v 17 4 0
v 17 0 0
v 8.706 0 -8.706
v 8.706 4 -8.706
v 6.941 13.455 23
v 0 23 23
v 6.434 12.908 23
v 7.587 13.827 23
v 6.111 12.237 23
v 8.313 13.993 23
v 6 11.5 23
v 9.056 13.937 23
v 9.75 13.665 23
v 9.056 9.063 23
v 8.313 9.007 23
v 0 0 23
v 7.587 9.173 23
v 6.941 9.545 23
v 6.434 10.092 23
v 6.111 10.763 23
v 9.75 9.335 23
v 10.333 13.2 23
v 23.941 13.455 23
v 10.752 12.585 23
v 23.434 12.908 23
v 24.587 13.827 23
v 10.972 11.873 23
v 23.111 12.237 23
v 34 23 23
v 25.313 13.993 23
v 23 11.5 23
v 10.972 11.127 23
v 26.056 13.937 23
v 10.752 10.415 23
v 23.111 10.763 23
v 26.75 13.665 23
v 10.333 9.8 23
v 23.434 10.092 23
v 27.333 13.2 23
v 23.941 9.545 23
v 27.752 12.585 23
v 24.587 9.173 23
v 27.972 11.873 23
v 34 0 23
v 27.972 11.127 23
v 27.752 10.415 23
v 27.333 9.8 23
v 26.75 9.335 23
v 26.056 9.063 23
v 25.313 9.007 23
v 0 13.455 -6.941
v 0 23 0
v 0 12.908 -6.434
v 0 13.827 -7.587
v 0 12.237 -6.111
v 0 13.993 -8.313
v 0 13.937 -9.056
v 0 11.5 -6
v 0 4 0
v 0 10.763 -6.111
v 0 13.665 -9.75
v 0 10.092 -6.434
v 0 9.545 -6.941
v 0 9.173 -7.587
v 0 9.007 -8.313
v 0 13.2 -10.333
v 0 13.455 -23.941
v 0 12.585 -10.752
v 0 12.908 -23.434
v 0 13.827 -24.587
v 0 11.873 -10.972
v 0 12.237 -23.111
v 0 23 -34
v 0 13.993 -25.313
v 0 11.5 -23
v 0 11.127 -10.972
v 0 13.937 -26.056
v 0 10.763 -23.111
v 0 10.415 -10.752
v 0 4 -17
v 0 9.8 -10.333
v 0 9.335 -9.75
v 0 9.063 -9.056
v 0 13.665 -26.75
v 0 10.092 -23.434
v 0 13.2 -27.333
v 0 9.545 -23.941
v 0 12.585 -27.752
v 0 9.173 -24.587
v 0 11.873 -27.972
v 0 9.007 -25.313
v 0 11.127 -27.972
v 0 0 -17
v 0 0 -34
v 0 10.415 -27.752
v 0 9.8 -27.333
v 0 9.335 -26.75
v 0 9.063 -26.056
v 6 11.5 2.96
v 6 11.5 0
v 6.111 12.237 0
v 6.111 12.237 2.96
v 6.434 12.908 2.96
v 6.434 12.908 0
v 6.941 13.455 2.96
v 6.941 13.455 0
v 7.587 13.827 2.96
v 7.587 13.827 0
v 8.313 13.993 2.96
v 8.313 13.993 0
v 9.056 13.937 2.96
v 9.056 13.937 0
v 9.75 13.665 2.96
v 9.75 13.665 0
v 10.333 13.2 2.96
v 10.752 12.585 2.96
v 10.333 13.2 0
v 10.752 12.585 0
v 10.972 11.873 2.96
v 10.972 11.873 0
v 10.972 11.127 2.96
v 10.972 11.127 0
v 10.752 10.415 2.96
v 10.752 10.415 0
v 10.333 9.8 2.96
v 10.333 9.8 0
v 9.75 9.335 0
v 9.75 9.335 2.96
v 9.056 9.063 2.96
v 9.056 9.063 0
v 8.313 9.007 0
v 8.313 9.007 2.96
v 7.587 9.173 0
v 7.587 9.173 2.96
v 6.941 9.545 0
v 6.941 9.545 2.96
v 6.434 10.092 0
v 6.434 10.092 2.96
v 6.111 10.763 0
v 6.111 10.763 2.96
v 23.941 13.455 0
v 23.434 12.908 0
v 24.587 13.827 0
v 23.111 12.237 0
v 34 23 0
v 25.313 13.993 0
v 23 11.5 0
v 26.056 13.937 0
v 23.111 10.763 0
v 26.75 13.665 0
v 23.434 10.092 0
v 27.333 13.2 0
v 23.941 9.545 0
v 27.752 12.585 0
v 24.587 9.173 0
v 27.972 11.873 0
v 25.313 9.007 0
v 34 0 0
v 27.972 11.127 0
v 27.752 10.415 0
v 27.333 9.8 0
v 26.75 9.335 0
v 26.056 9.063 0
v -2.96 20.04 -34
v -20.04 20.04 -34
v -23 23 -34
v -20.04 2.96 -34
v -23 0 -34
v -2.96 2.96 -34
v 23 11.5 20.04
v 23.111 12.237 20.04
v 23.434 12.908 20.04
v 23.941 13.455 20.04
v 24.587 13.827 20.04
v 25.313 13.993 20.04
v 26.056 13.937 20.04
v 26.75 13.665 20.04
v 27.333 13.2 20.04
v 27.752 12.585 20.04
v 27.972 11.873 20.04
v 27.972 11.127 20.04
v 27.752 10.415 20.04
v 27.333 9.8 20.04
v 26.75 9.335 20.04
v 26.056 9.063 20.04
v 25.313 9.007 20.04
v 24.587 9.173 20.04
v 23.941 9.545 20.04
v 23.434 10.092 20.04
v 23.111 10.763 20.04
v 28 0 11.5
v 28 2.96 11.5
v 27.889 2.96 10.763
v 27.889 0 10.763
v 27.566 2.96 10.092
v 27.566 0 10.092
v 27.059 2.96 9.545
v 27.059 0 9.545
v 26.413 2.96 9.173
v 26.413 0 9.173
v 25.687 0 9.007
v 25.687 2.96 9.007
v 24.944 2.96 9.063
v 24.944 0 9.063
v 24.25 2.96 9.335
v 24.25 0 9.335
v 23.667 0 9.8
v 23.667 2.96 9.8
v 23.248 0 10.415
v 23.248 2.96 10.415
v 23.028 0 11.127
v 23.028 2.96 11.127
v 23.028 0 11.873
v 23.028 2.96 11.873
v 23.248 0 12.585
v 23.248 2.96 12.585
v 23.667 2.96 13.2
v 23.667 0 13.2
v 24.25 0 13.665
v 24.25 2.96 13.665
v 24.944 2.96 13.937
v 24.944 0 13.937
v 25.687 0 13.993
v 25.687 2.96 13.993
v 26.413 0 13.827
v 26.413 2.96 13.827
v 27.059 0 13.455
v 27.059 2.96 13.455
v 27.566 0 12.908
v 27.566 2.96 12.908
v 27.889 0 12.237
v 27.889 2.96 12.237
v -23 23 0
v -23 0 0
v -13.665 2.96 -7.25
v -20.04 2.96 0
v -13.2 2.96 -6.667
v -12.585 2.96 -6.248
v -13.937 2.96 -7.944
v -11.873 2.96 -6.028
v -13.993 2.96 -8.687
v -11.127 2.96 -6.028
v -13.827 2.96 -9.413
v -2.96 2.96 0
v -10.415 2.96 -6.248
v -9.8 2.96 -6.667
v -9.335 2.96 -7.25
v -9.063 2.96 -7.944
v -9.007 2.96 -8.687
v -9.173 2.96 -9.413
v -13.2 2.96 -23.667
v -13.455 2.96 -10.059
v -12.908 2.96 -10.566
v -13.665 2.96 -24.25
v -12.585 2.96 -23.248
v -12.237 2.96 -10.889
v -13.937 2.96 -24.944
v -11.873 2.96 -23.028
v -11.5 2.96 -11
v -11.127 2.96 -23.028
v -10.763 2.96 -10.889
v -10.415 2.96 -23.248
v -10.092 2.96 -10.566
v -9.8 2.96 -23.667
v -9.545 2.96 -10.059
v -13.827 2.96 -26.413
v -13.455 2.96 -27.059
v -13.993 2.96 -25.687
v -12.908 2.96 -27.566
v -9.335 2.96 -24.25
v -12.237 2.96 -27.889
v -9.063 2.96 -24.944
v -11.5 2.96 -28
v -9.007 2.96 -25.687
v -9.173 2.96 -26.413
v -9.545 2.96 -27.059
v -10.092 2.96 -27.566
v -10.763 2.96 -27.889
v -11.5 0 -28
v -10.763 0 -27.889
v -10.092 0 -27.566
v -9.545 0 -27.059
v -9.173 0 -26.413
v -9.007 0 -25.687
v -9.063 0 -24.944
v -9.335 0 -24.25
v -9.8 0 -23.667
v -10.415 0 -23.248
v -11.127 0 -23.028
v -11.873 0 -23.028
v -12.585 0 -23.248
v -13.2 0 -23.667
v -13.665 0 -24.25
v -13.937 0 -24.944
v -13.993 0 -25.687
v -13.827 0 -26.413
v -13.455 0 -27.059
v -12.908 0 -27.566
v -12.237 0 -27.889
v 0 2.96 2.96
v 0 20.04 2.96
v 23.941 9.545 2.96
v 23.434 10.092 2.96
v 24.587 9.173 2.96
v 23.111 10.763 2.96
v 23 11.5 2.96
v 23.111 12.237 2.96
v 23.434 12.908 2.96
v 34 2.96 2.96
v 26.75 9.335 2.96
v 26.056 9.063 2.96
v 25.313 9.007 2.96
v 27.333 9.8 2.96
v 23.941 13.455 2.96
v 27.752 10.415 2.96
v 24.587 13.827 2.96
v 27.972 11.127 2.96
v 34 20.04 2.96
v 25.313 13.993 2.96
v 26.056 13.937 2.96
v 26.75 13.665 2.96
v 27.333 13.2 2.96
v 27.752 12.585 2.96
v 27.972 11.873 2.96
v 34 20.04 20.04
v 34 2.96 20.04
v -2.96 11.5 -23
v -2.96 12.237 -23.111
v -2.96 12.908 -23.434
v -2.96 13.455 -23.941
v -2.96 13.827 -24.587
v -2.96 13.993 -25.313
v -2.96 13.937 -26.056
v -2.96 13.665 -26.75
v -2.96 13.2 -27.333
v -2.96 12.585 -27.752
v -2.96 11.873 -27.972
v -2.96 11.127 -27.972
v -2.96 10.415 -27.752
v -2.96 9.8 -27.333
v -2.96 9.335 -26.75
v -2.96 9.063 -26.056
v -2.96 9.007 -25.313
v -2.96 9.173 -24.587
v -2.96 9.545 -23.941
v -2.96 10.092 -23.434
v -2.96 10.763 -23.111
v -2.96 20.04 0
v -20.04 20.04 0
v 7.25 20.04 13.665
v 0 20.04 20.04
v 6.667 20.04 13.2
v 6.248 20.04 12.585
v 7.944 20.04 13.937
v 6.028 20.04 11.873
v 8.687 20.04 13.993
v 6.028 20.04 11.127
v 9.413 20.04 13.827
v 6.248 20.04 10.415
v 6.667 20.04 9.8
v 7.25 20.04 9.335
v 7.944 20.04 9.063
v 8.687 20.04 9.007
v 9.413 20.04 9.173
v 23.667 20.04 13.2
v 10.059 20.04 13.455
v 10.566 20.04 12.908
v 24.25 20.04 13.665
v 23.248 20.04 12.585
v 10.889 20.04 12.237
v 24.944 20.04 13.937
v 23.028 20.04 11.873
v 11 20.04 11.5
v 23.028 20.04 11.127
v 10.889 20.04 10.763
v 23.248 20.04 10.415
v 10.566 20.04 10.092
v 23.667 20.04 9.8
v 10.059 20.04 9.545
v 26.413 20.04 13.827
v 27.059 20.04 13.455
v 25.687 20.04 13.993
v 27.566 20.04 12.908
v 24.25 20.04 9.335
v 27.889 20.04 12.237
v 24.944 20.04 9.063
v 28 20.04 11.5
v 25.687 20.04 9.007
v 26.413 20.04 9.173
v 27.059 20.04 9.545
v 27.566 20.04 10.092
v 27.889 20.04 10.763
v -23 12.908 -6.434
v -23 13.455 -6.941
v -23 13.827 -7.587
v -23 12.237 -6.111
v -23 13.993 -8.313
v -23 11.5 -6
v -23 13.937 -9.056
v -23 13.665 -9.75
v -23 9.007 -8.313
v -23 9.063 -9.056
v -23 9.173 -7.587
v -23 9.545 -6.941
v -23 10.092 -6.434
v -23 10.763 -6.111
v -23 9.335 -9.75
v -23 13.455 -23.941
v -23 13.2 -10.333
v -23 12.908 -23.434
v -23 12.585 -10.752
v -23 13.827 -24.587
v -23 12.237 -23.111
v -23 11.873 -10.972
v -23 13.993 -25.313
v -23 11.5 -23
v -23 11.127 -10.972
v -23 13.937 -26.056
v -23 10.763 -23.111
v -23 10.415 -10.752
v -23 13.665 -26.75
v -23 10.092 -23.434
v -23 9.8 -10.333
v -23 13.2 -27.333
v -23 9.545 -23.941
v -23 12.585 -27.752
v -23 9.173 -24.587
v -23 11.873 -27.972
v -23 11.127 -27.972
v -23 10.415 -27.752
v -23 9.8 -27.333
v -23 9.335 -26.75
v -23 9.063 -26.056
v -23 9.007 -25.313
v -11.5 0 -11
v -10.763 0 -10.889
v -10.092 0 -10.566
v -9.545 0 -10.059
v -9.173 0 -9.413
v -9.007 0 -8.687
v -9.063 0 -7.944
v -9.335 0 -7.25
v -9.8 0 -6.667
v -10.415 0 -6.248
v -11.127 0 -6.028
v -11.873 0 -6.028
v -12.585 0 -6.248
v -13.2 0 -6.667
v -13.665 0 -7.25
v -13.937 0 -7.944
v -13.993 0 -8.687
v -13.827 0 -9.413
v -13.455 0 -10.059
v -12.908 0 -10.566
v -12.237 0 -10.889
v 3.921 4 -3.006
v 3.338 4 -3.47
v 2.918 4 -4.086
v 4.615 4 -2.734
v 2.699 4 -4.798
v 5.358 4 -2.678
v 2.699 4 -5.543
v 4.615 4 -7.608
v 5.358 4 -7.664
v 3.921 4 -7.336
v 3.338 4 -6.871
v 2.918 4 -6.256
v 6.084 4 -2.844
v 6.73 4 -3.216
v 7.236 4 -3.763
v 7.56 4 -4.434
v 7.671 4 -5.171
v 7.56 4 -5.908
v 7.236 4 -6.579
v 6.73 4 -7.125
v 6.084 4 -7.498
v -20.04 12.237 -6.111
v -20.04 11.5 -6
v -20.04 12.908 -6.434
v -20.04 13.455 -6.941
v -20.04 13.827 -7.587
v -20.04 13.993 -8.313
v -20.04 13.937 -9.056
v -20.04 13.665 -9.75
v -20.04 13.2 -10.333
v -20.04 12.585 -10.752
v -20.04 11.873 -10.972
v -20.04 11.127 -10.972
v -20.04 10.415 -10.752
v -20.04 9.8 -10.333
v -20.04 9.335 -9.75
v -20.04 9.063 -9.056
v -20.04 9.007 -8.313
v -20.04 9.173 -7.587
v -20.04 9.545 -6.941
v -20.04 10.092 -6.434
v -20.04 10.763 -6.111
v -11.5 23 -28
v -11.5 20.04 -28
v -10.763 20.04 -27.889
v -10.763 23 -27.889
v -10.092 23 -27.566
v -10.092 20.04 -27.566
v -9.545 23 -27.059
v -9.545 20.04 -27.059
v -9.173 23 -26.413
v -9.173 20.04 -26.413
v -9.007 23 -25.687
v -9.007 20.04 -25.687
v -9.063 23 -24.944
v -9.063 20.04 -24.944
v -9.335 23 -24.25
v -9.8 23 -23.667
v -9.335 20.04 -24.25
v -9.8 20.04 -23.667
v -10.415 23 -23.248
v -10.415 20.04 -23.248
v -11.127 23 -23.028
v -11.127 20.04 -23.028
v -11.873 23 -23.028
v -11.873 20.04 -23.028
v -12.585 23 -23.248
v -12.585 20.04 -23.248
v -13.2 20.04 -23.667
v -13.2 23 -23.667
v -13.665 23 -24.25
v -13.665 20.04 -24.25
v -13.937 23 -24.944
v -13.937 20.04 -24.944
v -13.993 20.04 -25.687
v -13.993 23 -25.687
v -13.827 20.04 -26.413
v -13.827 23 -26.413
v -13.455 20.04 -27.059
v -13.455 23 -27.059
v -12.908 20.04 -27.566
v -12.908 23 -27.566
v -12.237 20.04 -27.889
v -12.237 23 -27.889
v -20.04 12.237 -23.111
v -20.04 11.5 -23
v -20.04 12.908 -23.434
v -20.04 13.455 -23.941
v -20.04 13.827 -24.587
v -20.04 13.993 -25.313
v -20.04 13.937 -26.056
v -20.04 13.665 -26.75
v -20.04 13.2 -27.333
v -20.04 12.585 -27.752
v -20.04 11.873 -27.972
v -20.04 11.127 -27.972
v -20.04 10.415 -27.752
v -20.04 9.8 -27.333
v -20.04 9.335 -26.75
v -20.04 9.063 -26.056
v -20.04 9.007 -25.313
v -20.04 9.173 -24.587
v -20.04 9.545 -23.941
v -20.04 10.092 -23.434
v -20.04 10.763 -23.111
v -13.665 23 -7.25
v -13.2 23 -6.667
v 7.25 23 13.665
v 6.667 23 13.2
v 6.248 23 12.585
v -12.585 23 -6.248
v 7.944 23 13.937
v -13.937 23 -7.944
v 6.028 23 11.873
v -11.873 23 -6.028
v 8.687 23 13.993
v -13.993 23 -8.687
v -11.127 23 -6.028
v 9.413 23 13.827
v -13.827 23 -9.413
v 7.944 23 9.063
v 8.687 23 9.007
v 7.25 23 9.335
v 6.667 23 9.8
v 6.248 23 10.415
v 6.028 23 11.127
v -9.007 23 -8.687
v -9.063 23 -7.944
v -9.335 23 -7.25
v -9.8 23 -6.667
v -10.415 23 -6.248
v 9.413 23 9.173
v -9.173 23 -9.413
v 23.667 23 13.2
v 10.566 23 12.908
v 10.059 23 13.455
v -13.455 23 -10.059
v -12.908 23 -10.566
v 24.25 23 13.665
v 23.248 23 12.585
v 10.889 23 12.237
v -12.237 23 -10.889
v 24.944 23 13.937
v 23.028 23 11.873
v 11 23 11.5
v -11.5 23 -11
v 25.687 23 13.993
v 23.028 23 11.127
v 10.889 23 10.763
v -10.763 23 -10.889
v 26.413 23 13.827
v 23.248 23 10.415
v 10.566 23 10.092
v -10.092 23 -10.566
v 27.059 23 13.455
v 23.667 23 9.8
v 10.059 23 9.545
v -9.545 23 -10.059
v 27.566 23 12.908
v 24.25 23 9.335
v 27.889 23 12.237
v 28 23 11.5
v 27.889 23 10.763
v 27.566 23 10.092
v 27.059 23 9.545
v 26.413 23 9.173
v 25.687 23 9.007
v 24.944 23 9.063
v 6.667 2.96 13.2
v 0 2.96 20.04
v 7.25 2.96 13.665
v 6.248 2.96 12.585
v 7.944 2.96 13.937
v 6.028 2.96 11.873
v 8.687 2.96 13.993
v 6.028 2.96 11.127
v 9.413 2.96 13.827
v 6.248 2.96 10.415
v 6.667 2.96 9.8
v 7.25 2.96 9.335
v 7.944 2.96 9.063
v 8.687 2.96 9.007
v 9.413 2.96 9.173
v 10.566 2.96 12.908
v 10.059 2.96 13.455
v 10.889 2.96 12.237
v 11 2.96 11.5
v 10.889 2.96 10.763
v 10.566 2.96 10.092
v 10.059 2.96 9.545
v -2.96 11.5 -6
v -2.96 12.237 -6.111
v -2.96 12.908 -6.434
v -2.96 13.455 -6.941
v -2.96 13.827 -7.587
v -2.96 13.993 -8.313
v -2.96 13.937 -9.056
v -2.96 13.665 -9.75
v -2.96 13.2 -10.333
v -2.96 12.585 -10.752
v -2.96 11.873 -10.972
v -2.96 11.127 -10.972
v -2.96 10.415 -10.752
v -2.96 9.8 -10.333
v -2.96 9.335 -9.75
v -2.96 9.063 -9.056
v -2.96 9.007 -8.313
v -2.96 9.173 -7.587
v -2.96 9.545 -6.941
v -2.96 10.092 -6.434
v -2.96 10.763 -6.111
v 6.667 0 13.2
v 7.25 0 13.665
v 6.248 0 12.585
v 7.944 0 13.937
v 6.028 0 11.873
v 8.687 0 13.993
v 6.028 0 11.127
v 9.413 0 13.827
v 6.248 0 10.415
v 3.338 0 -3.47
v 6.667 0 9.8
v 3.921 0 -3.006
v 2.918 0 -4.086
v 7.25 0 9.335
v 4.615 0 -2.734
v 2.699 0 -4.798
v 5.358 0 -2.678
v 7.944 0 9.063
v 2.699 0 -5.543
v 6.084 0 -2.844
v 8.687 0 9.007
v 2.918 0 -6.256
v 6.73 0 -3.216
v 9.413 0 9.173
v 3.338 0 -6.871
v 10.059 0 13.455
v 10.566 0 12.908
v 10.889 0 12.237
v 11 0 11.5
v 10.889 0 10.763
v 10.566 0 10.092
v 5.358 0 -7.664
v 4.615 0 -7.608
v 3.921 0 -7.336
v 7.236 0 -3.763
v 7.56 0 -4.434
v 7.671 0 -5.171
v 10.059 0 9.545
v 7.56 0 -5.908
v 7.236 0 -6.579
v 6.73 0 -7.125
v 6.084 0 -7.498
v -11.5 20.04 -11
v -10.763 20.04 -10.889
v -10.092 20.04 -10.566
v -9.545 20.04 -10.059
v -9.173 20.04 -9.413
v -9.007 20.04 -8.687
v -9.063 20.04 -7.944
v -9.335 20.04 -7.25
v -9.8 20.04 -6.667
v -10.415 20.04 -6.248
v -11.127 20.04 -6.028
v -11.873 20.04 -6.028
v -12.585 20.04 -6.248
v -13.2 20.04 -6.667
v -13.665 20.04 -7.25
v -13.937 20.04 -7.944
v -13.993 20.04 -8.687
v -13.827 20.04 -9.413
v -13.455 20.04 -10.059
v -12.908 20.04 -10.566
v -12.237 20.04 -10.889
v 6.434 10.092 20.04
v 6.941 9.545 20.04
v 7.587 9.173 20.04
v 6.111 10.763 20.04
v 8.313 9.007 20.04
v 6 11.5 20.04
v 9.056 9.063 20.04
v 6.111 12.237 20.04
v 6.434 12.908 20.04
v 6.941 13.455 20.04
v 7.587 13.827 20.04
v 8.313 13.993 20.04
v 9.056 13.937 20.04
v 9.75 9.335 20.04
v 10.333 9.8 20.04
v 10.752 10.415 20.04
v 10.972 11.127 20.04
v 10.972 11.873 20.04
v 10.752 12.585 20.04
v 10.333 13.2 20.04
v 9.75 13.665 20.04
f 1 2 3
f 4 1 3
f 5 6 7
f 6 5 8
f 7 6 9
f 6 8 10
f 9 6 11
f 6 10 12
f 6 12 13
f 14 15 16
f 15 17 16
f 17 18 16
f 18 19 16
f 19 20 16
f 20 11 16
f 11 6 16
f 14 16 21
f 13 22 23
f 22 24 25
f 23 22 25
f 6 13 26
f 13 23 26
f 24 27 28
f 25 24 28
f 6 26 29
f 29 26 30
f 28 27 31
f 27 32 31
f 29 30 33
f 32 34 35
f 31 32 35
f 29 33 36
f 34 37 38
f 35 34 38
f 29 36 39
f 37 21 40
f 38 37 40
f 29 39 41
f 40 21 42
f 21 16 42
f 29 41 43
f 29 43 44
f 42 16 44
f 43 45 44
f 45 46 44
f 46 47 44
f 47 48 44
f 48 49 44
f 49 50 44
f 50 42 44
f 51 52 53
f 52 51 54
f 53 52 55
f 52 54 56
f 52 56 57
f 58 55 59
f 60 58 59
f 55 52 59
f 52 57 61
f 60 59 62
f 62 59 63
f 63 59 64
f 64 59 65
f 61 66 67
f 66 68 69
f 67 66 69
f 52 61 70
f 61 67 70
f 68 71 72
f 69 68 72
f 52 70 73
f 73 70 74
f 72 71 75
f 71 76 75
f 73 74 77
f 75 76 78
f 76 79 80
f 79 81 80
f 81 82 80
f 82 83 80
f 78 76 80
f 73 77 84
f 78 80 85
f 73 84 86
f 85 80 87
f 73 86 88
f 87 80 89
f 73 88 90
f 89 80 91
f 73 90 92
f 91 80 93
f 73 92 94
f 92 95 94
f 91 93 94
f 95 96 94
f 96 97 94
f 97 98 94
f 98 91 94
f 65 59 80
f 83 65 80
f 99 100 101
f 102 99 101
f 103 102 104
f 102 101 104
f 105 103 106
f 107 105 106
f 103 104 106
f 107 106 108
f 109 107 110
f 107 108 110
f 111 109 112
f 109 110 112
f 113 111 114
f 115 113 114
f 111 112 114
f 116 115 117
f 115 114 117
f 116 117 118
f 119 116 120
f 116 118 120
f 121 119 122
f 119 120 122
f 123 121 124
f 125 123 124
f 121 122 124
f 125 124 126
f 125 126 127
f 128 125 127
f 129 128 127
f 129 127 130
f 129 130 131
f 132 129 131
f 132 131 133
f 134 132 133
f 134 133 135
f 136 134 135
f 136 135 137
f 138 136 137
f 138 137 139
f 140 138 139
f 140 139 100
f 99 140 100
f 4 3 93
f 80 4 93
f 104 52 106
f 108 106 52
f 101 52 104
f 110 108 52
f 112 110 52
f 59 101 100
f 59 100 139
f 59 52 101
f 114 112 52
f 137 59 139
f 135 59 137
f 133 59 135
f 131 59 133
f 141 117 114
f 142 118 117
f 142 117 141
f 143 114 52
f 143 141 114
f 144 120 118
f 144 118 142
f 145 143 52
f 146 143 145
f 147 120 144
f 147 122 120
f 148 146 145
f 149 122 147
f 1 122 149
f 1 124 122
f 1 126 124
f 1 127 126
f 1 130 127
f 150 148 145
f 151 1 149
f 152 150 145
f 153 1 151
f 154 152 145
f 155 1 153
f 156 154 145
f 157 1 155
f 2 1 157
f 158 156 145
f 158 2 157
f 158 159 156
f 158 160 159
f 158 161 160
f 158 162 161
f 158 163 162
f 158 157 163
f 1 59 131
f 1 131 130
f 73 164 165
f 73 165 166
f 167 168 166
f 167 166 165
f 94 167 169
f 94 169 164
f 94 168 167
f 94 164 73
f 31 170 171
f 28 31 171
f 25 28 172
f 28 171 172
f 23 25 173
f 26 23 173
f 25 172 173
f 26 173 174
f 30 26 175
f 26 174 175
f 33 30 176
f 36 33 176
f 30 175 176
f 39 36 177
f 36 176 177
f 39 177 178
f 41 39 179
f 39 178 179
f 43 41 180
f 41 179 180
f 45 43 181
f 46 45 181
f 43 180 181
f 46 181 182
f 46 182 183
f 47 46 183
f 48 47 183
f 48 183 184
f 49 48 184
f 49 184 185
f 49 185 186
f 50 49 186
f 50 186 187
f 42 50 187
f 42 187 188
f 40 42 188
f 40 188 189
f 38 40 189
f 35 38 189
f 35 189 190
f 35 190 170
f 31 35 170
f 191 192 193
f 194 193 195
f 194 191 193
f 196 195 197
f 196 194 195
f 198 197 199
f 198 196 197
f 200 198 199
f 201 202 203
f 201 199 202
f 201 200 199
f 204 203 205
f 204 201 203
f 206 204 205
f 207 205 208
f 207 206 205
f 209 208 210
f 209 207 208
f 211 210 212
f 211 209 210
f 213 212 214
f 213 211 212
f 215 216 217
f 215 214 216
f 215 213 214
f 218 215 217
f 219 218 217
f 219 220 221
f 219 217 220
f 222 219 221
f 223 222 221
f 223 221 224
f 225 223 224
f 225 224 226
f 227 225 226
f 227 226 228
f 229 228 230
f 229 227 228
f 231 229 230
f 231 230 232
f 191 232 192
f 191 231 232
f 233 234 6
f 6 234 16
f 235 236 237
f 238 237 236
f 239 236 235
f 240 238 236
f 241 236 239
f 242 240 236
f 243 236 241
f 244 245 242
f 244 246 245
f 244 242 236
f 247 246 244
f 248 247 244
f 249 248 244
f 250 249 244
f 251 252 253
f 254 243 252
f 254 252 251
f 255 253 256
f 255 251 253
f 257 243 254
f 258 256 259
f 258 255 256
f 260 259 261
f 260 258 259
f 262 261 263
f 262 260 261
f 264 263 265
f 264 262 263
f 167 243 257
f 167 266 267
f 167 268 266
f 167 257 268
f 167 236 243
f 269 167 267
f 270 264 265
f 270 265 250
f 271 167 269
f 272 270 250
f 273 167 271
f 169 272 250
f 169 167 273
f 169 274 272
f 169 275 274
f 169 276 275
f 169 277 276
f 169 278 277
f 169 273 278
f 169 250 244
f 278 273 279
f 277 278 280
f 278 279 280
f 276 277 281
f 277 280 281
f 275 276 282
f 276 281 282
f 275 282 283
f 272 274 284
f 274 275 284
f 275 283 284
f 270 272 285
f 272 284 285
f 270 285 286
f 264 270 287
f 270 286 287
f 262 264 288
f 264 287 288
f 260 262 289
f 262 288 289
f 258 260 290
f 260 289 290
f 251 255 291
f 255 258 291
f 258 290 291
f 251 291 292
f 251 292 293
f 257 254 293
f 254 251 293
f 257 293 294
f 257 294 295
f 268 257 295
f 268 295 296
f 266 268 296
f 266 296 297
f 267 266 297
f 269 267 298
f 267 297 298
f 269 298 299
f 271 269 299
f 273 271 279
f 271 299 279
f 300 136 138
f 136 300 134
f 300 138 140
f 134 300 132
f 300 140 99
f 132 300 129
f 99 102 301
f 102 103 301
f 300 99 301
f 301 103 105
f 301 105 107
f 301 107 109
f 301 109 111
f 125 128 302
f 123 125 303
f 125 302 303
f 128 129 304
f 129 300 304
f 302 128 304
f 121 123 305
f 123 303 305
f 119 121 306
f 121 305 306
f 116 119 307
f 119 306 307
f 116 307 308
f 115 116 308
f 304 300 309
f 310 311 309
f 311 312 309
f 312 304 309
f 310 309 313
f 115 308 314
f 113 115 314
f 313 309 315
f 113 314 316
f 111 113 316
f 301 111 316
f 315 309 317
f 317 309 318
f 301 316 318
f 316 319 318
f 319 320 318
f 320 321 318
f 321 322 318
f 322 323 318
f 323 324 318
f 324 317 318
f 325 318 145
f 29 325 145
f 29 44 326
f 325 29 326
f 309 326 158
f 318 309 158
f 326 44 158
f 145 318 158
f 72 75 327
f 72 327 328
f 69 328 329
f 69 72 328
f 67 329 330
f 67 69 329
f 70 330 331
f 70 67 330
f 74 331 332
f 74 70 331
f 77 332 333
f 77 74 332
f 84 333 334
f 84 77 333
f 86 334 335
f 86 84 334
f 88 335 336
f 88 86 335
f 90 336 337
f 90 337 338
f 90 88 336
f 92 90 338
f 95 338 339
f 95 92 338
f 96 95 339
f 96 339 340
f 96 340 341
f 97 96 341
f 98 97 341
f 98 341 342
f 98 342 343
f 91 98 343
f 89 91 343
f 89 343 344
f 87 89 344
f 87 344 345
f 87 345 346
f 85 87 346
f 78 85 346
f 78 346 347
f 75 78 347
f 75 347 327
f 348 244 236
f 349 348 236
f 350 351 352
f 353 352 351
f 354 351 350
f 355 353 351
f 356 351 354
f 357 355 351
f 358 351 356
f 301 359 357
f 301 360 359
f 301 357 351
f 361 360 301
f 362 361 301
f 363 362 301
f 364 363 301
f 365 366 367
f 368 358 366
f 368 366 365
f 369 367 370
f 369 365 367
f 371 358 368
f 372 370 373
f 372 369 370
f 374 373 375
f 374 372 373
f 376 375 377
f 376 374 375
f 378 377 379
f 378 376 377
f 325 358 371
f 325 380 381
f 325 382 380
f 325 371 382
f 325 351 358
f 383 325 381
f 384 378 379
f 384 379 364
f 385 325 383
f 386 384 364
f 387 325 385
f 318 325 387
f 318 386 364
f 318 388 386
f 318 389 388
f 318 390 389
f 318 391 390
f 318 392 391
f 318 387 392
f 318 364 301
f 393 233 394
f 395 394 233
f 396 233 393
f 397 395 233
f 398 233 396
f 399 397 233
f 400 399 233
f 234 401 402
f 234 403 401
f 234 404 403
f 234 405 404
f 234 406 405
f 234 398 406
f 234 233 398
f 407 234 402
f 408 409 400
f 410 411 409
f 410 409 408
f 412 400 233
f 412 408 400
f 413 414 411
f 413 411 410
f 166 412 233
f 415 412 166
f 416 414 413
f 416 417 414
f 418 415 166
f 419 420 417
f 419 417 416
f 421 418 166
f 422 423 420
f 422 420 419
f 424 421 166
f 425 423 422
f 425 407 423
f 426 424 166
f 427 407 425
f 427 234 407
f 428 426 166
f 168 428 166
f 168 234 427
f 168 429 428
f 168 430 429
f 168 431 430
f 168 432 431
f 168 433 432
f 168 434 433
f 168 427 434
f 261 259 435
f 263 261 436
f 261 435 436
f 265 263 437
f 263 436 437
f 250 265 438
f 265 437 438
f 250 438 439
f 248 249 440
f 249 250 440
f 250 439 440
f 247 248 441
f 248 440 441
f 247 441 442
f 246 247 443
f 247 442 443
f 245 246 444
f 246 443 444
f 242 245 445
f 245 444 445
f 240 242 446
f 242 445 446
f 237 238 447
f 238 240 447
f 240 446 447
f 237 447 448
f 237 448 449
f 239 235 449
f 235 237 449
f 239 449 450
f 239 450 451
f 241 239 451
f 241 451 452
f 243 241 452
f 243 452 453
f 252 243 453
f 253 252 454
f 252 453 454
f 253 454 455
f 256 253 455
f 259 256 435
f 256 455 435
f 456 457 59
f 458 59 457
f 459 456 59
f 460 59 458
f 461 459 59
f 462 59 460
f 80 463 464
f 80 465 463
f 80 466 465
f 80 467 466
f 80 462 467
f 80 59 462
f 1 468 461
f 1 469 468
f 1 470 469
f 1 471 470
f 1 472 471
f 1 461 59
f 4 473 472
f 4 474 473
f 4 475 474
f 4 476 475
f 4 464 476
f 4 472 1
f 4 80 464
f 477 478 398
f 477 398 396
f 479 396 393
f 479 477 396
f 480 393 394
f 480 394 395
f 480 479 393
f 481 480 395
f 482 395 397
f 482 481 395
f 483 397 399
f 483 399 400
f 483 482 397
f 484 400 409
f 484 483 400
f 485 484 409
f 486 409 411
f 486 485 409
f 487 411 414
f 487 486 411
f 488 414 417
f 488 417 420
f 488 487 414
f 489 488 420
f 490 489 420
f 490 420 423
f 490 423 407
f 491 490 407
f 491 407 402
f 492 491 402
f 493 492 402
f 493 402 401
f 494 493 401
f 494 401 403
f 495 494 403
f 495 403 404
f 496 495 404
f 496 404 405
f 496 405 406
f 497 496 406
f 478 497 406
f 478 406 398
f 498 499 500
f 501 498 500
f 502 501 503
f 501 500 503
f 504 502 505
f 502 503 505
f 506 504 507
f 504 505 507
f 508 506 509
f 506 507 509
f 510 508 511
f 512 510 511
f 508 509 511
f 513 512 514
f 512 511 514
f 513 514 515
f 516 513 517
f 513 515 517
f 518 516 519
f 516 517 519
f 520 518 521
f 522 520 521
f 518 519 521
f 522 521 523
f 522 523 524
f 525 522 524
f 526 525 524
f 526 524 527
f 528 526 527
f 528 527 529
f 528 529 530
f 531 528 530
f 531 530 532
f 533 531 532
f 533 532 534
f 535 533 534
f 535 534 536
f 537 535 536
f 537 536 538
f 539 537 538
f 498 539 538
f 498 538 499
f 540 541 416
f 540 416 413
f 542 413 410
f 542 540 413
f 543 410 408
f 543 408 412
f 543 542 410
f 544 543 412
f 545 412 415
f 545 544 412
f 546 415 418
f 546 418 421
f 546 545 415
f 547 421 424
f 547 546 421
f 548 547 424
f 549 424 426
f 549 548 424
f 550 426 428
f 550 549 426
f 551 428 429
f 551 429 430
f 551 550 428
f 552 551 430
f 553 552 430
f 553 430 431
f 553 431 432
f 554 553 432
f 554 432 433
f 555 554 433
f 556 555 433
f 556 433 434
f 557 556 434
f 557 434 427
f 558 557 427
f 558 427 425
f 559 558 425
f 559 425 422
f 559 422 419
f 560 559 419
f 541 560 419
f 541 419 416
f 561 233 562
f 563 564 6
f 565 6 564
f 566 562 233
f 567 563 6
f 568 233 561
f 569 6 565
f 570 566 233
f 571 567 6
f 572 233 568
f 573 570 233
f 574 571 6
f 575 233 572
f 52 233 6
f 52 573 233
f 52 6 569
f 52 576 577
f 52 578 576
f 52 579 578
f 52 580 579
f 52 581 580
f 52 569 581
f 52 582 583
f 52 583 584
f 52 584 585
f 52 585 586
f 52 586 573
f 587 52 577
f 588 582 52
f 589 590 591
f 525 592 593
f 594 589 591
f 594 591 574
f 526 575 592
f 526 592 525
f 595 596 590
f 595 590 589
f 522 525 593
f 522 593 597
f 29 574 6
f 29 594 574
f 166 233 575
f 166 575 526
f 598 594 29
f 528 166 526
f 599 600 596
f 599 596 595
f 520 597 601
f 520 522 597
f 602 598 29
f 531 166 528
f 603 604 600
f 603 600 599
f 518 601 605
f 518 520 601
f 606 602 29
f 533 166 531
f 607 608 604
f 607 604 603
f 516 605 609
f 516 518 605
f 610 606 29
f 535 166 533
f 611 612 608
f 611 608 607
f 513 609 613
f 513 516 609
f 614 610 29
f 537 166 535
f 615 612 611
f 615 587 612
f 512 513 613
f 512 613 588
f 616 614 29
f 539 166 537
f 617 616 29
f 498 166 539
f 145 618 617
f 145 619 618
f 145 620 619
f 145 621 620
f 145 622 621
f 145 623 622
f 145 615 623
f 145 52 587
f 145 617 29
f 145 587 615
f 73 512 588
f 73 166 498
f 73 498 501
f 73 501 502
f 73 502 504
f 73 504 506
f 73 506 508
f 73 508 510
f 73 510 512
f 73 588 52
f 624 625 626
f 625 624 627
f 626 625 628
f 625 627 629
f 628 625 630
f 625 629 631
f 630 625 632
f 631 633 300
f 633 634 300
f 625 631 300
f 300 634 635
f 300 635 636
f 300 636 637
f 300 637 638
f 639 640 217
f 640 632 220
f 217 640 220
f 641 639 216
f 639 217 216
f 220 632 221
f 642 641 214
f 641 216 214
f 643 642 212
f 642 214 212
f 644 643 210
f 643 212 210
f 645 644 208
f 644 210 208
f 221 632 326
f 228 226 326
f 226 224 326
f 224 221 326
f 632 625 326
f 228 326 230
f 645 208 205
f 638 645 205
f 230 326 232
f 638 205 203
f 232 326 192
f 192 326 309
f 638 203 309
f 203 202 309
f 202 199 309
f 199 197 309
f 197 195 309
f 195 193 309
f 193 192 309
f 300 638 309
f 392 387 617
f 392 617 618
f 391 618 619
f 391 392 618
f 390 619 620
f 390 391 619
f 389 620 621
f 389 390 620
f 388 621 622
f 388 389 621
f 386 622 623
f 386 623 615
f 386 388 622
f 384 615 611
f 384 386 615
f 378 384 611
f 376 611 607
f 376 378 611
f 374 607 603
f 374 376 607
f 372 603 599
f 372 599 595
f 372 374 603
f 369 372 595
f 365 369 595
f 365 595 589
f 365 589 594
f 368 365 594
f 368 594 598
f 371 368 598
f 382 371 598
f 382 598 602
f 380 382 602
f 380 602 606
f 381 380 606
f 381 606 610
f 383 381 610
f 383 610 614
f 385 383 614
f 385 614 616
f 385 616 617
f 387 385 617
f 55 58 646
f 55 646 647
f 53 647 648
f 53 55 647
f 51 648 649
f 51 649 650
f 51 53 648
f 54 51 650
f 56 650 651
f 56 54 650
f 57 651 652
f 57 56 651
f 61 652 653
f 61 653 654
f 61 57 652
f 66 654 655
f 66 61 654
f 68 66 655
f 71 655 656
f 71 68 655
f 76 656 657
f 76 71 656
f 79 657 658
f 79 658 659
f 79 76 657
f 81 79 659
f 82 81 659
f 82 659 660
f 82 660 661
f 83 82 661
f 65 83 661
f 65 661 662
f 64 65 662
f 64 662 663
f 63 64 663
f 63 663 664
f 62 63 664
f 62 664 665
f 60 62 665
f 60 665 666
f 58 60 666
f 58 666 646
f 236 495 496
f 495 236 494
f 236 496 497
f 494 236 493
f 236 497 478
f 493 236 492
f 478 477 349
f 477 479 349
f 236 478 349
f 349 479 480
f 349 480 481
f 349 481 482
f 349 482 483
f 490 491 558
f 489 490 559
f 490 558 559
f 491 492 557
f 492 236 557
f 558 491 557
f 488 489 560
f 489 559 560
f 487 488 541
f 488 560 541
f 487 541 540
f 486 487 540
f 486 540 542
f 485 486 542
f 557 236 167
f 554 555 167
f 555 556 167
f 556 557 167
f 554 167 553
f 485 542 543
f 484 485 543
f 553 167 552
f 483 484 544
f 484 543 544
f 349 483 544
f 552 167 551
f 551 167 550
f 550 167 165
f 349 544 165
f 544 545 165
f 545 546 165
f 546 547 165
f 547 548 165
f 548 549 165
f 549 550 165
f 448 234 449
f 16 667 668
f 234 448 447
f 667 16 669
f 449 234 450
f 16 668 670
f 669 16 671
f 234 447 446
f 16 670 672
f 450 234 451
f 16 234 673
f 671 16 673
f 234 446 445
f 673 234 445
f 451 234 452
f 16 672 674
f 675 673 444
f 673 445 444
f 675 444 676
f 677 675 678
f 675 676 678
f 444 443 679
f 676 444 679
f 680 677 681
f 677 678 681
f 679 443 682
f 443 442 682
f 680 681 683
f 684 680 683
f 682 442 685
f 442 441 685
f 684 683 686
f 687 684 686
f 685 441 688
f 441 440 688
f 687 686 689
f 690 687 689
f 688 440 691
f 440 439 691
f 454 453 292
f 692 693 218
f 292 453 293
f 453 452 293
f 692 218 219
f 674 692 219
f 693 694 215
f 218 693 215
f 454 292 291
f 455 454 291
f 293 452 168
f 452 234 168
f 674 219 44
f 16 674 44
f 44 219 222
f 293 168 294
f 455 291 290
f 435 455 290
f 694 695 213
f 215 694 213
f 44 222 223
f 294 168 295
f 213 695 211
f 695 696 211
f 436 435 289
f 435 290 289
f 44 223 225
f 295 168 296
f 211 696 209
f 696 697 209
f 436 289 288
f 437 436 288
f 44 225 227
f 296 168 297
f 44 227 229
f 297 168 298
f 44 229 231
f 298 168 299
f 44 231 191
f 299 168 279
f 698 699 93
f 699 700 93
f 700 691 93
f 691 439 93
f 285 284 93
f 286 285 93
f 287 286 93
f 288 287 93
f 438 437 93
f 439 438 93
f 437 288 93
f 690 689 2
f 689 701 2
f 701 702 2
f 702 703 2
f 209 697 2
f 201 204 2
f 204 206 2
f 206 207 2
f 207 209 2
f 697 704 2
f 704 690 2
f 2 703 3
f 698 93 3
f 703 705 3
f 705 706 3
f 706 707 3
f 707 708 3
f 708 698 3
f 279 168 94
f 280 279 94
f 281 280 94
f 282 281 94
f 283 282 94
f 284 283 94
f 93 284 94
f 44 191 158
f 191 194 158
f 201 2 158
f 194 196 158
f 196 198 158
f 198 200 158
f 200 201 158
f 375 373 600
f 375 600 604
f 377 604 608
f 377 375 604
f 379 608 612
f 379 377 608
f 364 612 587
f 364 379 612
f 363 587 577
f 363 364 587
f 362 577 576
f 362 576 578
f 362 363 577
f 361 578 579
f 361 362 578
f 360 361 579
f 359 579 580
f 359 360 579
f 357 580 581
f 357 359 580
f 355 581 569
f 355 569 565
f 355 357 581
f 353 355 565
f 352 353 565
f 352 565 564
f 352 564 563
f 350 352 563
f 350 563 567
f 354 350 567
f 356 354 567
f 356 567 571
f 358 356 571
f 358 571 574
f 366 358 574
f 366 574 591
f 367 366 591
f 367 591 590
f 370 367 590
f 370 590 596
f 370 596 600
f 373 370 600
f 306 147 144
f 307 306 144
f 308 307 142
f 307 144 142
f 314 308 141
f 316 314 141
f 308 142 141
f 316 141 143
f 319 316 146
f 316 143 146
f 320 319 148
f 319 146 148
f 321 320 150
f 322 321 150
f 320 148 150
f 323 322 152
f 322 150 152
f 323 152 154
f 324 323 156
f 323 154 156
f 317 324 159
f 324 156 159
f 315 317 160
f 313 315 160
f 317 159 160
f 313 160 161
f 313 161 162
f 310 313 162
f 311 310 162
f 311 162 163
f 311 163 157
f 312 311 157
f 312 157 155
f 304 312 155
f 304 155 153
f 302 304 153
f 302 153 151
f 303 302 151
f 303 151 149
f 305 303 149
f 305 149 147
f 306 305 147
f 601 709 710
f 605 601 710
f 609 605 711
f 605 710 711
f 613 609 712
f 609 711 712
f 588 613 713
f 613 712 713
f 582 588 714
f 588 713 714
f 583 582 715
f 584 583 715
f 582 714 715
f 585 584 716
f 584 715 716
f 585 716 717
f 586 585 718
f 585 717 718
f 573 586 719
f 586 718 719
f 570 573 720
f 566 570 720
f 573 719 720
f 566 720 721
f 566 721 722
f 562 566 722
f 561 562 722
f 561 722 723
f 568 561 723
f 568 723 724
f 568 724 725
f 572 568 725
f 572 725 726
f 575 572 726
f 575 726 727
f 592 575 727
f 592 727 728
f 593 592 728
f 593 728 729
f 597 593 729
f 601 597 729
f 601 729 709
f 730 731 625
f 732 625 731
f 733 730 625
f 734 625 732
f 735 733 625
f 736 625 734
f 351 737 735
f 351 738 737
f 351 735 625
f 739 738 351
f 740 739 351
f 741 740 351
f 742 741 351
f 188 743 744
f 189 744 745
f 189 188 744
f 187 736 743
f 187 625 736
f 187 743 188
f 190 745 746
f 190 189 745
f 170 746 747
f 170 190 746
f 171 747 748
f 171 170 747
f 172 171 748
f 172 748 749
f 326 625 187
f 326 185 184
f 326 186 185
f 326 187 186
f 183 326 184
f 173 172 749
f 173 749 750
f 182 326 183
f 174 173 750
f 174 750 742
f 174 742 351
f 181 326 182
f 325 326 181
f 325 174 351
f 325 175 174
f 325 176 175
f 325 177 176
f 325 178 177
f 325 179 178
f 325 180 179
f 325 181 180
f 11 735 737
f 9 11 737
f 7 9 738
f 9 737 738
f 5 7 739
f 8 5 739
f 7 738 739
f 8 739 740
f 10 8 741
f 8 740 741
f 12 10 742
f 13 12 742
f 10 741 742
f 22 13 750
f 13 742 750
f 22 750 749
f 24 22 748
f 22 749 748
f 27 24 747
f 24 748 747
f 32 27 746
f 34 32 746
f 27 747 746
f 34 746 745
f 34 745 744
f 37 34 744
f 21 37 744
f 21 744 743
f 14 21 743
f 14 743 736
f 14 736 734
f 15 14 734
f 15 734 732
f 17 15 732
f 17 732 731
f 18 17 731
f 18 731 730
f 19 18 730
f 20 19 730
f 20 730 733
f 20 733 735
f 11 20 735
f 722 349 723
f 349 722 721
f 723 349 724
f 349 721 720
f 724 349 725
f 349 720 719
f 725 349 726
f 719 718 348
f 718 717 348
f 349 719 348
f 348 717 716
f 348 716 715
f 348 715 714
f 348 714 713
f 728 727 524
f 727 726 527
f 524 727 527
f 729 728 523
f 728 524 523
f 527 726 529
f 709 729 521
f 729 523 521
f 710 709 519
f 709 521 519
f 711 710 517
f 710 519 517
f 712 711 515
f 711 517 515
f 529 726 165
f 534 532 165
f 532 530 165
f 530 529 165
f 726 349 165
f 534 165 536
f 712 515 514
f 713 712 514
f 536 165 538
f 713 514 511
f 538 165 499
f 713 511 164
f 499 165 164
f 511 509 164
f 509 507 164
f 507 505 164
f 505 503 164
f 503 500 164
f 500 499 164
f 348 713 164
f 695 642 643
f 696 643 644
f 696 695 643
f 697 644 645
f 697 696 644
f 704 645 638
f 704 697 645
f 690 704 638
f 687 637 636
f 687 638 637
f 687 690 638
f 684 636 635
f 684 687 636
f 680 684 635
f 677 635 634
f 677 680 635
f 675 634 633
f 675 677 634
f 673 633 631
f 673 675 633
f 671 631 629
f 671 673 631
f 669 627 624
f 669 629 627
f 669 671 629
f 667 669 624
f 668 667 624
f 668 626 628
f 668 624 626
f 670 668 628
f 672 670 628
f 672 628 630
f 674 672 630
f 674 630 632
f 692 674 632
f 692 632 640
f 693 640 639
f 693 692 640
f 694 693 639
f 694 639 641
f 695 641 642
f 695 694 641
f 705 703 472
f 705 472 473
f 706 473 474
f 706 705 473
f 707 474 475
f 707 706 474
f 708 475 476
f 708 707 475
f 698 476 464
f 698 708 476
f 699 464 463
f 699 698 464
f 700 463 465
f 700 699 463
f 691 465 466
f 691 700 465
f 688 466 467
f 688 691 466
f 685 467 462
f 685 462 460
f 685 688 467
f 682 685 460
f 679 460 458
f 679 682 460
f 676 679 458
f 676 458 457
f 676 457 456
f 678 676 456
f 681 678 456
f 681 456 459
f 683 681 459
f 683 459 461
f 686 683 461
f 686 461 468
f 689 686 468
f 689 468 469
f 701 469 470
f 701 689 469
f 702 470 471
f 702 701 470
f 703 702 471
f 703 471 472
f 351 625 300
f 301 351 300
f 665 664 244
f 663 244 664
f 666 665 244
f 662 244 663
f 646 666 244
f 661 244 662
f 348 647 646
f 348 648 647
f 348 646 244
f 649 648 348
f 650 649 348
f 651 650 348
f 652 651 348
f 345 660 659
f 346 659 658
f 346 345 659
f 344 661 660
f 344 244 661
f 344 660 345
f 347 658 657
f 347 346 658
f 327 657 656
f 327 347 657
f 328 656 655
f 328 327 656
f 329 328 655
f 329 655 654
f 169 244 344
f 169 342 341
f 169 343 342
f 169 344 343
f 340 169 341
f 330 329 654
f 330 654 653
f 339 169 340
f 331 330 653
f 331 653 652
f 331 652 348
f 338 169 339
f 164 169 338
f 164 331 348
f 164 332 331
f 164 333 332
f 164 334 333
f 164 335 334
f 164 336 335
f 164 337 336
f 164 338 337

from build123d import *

# Parameters (mm, degrees)
SKETCH1_W           = 34
SKETCH1_H           = 23
SKETCH1_R           = 2.5
BOSS_EXTRUDE1_DEPTH = 23
SKETCH6_OUTSIDE_W   = 45.41
SKETCH6_OUTSIDE_H   = 34.41
SKETCH6_OUTSIDE_W_2 = 34
SKETCH6_OUTSIDE_H_2 = 23
SKETCH6_OUTSIDE_R   = 2.5
CUT_EXTRUDE10_DEPTH = 24
SKETCH7_OUTSIDE_W   = 34.41
SKETCH7_OUTSIDE_H   = 34.41
SKETCH7_OUTSIDE_W_2 = 23
SKETCH7_OUTSIDE_H_2 = 23
SKETCH7_OUTSIDE_W_3 = 17.08
SKETCH7_OUTSIDE_H_3 = 17.08
CUT_EXTRUDE11_DEPTH = 34
BOSS_EXTRUDE2_DEPTH = 23
SKETCH13_R          = 2.5
BOSS_EXTRUDE3_DEPTH = 4


with BuildPart() as part:
    # sketch1 → Boss-Extrude1 (new body)
    with BuildSketch(Plane(origin=(0, 0, 0), x_dir=(1, 0, 0), z_dir=(0, 1, 0))):
        with Locations((17, -11.5)):
            Rectangle(SKETCH1_W, SKETCH1_H)
        with Locations((8.5, -11.5)):
            Circle(SKETCH1_R, mode=Mode.SUBTRACT)
        with Locations((25.5, -11.5)):
            Circle(SKETCH1_R, mode=Mode.SUBTRACT)
    extrude(amount=BOSS_EXTRUDE1_DEPTH)

    # Sketch6 outside → Cut-Extrude10 (cut, through all)
    with BuildSketch(Plane(origin=(0, 0, 0), x_dir=(-1, 0, 0), z_dir=(0, 0, -1))):
        with Locations((-17, 11.5)):
            Rectangle(SKETCH6_OUTSIDE_W, SKETCH6_OUTSIDE_H)
        with Locations((-17, 11.5)):
            Rectangle(SKETCH6_OUTSIDE_W_2, SKETCH6_OUTSIDE_H_2, mode=Mode.SUBTRACT)
        with Locations((-25.5, 11.5)):
            Circle(SKETCH6_OUTSIDE_R)
        with Locations((-8.5, 11.5)):
            Circle(SKETCH6_OUTSIDE_R)
    extrude(amount=-CUT_EXTRUDE10_DEPTH, mode=Mode.SUBTRACT)

    # Sketch7 outside → Cut-Extrude11 (cut)
    with BuildSketch(Plane(origin=(34, 0, 0), x_dir=(0, 0, -1), z_dir=(1, 0, 0))):
        with Locations((-11.5, 11.5)):
            Rectangle(SKETCH7_OUTSIDE_W, SKETCH7_OUTSIDE_H)
        with Locations((-11.5, 11.5)):
            Rectangle(SKETCH7_OUTSIDE_W_2, SKETCH7_OUTSIDE_H_2, mode=Mode.SUBTRACT)
        with Locations((-11.5, 11.5)):
            Rectangle(SKETCH7_OUTSIDE_W_3, SKETCH7_OUTSIDE_H_3)
    extrude(amount=-CUT_EXTRUDE11_DEPTH, mode=Mode.SUBTRACT)


with BuildPart() as body_2:
    # Mirror6: mirrored copy
    add(part.part.mirror(Plane(origin=(0, 0, 0), x_dir=(-0.707106781, 0, 0.707106781), z_dir=(-0.707106781, 0, -0.707106781))))


with BuildPart() as part_1:
    add(part.part)

    add(body_2.part)  # Boss-Extrude2 merges body 2
    # Sketch11 → Boss-Extrude2 (add)
    with BuildSketch(Plane(origin=(0, 0, 0), x_dir=(1, 0, 0), z_dir=(0, 1, 0))):
        Polygon((-23, 0), (0, -23), (0, 0), align=None)
    extrude(amount=BOSS_EXTRUDE2_DEPTH)

    # Sketch13 → Boss-Extrude3 (add)
    with BuildSketch(Plane(origin=(0, 0, 0), x_dir=(1, 0, 0), z_dir=(0, 1, 0))):
        Polygon((8.706365938, 8.706365938), (0, 17), (0, 0), (17, 0), align=None)
        with Locations((5.170832032, 5.170832032)):
            Circle(SKETCH13_R, mode=Mode.SUBTRACT)
    extrude(amount=BOSS_EXTRUDE3_DEPTH)


solid = part_1.part
